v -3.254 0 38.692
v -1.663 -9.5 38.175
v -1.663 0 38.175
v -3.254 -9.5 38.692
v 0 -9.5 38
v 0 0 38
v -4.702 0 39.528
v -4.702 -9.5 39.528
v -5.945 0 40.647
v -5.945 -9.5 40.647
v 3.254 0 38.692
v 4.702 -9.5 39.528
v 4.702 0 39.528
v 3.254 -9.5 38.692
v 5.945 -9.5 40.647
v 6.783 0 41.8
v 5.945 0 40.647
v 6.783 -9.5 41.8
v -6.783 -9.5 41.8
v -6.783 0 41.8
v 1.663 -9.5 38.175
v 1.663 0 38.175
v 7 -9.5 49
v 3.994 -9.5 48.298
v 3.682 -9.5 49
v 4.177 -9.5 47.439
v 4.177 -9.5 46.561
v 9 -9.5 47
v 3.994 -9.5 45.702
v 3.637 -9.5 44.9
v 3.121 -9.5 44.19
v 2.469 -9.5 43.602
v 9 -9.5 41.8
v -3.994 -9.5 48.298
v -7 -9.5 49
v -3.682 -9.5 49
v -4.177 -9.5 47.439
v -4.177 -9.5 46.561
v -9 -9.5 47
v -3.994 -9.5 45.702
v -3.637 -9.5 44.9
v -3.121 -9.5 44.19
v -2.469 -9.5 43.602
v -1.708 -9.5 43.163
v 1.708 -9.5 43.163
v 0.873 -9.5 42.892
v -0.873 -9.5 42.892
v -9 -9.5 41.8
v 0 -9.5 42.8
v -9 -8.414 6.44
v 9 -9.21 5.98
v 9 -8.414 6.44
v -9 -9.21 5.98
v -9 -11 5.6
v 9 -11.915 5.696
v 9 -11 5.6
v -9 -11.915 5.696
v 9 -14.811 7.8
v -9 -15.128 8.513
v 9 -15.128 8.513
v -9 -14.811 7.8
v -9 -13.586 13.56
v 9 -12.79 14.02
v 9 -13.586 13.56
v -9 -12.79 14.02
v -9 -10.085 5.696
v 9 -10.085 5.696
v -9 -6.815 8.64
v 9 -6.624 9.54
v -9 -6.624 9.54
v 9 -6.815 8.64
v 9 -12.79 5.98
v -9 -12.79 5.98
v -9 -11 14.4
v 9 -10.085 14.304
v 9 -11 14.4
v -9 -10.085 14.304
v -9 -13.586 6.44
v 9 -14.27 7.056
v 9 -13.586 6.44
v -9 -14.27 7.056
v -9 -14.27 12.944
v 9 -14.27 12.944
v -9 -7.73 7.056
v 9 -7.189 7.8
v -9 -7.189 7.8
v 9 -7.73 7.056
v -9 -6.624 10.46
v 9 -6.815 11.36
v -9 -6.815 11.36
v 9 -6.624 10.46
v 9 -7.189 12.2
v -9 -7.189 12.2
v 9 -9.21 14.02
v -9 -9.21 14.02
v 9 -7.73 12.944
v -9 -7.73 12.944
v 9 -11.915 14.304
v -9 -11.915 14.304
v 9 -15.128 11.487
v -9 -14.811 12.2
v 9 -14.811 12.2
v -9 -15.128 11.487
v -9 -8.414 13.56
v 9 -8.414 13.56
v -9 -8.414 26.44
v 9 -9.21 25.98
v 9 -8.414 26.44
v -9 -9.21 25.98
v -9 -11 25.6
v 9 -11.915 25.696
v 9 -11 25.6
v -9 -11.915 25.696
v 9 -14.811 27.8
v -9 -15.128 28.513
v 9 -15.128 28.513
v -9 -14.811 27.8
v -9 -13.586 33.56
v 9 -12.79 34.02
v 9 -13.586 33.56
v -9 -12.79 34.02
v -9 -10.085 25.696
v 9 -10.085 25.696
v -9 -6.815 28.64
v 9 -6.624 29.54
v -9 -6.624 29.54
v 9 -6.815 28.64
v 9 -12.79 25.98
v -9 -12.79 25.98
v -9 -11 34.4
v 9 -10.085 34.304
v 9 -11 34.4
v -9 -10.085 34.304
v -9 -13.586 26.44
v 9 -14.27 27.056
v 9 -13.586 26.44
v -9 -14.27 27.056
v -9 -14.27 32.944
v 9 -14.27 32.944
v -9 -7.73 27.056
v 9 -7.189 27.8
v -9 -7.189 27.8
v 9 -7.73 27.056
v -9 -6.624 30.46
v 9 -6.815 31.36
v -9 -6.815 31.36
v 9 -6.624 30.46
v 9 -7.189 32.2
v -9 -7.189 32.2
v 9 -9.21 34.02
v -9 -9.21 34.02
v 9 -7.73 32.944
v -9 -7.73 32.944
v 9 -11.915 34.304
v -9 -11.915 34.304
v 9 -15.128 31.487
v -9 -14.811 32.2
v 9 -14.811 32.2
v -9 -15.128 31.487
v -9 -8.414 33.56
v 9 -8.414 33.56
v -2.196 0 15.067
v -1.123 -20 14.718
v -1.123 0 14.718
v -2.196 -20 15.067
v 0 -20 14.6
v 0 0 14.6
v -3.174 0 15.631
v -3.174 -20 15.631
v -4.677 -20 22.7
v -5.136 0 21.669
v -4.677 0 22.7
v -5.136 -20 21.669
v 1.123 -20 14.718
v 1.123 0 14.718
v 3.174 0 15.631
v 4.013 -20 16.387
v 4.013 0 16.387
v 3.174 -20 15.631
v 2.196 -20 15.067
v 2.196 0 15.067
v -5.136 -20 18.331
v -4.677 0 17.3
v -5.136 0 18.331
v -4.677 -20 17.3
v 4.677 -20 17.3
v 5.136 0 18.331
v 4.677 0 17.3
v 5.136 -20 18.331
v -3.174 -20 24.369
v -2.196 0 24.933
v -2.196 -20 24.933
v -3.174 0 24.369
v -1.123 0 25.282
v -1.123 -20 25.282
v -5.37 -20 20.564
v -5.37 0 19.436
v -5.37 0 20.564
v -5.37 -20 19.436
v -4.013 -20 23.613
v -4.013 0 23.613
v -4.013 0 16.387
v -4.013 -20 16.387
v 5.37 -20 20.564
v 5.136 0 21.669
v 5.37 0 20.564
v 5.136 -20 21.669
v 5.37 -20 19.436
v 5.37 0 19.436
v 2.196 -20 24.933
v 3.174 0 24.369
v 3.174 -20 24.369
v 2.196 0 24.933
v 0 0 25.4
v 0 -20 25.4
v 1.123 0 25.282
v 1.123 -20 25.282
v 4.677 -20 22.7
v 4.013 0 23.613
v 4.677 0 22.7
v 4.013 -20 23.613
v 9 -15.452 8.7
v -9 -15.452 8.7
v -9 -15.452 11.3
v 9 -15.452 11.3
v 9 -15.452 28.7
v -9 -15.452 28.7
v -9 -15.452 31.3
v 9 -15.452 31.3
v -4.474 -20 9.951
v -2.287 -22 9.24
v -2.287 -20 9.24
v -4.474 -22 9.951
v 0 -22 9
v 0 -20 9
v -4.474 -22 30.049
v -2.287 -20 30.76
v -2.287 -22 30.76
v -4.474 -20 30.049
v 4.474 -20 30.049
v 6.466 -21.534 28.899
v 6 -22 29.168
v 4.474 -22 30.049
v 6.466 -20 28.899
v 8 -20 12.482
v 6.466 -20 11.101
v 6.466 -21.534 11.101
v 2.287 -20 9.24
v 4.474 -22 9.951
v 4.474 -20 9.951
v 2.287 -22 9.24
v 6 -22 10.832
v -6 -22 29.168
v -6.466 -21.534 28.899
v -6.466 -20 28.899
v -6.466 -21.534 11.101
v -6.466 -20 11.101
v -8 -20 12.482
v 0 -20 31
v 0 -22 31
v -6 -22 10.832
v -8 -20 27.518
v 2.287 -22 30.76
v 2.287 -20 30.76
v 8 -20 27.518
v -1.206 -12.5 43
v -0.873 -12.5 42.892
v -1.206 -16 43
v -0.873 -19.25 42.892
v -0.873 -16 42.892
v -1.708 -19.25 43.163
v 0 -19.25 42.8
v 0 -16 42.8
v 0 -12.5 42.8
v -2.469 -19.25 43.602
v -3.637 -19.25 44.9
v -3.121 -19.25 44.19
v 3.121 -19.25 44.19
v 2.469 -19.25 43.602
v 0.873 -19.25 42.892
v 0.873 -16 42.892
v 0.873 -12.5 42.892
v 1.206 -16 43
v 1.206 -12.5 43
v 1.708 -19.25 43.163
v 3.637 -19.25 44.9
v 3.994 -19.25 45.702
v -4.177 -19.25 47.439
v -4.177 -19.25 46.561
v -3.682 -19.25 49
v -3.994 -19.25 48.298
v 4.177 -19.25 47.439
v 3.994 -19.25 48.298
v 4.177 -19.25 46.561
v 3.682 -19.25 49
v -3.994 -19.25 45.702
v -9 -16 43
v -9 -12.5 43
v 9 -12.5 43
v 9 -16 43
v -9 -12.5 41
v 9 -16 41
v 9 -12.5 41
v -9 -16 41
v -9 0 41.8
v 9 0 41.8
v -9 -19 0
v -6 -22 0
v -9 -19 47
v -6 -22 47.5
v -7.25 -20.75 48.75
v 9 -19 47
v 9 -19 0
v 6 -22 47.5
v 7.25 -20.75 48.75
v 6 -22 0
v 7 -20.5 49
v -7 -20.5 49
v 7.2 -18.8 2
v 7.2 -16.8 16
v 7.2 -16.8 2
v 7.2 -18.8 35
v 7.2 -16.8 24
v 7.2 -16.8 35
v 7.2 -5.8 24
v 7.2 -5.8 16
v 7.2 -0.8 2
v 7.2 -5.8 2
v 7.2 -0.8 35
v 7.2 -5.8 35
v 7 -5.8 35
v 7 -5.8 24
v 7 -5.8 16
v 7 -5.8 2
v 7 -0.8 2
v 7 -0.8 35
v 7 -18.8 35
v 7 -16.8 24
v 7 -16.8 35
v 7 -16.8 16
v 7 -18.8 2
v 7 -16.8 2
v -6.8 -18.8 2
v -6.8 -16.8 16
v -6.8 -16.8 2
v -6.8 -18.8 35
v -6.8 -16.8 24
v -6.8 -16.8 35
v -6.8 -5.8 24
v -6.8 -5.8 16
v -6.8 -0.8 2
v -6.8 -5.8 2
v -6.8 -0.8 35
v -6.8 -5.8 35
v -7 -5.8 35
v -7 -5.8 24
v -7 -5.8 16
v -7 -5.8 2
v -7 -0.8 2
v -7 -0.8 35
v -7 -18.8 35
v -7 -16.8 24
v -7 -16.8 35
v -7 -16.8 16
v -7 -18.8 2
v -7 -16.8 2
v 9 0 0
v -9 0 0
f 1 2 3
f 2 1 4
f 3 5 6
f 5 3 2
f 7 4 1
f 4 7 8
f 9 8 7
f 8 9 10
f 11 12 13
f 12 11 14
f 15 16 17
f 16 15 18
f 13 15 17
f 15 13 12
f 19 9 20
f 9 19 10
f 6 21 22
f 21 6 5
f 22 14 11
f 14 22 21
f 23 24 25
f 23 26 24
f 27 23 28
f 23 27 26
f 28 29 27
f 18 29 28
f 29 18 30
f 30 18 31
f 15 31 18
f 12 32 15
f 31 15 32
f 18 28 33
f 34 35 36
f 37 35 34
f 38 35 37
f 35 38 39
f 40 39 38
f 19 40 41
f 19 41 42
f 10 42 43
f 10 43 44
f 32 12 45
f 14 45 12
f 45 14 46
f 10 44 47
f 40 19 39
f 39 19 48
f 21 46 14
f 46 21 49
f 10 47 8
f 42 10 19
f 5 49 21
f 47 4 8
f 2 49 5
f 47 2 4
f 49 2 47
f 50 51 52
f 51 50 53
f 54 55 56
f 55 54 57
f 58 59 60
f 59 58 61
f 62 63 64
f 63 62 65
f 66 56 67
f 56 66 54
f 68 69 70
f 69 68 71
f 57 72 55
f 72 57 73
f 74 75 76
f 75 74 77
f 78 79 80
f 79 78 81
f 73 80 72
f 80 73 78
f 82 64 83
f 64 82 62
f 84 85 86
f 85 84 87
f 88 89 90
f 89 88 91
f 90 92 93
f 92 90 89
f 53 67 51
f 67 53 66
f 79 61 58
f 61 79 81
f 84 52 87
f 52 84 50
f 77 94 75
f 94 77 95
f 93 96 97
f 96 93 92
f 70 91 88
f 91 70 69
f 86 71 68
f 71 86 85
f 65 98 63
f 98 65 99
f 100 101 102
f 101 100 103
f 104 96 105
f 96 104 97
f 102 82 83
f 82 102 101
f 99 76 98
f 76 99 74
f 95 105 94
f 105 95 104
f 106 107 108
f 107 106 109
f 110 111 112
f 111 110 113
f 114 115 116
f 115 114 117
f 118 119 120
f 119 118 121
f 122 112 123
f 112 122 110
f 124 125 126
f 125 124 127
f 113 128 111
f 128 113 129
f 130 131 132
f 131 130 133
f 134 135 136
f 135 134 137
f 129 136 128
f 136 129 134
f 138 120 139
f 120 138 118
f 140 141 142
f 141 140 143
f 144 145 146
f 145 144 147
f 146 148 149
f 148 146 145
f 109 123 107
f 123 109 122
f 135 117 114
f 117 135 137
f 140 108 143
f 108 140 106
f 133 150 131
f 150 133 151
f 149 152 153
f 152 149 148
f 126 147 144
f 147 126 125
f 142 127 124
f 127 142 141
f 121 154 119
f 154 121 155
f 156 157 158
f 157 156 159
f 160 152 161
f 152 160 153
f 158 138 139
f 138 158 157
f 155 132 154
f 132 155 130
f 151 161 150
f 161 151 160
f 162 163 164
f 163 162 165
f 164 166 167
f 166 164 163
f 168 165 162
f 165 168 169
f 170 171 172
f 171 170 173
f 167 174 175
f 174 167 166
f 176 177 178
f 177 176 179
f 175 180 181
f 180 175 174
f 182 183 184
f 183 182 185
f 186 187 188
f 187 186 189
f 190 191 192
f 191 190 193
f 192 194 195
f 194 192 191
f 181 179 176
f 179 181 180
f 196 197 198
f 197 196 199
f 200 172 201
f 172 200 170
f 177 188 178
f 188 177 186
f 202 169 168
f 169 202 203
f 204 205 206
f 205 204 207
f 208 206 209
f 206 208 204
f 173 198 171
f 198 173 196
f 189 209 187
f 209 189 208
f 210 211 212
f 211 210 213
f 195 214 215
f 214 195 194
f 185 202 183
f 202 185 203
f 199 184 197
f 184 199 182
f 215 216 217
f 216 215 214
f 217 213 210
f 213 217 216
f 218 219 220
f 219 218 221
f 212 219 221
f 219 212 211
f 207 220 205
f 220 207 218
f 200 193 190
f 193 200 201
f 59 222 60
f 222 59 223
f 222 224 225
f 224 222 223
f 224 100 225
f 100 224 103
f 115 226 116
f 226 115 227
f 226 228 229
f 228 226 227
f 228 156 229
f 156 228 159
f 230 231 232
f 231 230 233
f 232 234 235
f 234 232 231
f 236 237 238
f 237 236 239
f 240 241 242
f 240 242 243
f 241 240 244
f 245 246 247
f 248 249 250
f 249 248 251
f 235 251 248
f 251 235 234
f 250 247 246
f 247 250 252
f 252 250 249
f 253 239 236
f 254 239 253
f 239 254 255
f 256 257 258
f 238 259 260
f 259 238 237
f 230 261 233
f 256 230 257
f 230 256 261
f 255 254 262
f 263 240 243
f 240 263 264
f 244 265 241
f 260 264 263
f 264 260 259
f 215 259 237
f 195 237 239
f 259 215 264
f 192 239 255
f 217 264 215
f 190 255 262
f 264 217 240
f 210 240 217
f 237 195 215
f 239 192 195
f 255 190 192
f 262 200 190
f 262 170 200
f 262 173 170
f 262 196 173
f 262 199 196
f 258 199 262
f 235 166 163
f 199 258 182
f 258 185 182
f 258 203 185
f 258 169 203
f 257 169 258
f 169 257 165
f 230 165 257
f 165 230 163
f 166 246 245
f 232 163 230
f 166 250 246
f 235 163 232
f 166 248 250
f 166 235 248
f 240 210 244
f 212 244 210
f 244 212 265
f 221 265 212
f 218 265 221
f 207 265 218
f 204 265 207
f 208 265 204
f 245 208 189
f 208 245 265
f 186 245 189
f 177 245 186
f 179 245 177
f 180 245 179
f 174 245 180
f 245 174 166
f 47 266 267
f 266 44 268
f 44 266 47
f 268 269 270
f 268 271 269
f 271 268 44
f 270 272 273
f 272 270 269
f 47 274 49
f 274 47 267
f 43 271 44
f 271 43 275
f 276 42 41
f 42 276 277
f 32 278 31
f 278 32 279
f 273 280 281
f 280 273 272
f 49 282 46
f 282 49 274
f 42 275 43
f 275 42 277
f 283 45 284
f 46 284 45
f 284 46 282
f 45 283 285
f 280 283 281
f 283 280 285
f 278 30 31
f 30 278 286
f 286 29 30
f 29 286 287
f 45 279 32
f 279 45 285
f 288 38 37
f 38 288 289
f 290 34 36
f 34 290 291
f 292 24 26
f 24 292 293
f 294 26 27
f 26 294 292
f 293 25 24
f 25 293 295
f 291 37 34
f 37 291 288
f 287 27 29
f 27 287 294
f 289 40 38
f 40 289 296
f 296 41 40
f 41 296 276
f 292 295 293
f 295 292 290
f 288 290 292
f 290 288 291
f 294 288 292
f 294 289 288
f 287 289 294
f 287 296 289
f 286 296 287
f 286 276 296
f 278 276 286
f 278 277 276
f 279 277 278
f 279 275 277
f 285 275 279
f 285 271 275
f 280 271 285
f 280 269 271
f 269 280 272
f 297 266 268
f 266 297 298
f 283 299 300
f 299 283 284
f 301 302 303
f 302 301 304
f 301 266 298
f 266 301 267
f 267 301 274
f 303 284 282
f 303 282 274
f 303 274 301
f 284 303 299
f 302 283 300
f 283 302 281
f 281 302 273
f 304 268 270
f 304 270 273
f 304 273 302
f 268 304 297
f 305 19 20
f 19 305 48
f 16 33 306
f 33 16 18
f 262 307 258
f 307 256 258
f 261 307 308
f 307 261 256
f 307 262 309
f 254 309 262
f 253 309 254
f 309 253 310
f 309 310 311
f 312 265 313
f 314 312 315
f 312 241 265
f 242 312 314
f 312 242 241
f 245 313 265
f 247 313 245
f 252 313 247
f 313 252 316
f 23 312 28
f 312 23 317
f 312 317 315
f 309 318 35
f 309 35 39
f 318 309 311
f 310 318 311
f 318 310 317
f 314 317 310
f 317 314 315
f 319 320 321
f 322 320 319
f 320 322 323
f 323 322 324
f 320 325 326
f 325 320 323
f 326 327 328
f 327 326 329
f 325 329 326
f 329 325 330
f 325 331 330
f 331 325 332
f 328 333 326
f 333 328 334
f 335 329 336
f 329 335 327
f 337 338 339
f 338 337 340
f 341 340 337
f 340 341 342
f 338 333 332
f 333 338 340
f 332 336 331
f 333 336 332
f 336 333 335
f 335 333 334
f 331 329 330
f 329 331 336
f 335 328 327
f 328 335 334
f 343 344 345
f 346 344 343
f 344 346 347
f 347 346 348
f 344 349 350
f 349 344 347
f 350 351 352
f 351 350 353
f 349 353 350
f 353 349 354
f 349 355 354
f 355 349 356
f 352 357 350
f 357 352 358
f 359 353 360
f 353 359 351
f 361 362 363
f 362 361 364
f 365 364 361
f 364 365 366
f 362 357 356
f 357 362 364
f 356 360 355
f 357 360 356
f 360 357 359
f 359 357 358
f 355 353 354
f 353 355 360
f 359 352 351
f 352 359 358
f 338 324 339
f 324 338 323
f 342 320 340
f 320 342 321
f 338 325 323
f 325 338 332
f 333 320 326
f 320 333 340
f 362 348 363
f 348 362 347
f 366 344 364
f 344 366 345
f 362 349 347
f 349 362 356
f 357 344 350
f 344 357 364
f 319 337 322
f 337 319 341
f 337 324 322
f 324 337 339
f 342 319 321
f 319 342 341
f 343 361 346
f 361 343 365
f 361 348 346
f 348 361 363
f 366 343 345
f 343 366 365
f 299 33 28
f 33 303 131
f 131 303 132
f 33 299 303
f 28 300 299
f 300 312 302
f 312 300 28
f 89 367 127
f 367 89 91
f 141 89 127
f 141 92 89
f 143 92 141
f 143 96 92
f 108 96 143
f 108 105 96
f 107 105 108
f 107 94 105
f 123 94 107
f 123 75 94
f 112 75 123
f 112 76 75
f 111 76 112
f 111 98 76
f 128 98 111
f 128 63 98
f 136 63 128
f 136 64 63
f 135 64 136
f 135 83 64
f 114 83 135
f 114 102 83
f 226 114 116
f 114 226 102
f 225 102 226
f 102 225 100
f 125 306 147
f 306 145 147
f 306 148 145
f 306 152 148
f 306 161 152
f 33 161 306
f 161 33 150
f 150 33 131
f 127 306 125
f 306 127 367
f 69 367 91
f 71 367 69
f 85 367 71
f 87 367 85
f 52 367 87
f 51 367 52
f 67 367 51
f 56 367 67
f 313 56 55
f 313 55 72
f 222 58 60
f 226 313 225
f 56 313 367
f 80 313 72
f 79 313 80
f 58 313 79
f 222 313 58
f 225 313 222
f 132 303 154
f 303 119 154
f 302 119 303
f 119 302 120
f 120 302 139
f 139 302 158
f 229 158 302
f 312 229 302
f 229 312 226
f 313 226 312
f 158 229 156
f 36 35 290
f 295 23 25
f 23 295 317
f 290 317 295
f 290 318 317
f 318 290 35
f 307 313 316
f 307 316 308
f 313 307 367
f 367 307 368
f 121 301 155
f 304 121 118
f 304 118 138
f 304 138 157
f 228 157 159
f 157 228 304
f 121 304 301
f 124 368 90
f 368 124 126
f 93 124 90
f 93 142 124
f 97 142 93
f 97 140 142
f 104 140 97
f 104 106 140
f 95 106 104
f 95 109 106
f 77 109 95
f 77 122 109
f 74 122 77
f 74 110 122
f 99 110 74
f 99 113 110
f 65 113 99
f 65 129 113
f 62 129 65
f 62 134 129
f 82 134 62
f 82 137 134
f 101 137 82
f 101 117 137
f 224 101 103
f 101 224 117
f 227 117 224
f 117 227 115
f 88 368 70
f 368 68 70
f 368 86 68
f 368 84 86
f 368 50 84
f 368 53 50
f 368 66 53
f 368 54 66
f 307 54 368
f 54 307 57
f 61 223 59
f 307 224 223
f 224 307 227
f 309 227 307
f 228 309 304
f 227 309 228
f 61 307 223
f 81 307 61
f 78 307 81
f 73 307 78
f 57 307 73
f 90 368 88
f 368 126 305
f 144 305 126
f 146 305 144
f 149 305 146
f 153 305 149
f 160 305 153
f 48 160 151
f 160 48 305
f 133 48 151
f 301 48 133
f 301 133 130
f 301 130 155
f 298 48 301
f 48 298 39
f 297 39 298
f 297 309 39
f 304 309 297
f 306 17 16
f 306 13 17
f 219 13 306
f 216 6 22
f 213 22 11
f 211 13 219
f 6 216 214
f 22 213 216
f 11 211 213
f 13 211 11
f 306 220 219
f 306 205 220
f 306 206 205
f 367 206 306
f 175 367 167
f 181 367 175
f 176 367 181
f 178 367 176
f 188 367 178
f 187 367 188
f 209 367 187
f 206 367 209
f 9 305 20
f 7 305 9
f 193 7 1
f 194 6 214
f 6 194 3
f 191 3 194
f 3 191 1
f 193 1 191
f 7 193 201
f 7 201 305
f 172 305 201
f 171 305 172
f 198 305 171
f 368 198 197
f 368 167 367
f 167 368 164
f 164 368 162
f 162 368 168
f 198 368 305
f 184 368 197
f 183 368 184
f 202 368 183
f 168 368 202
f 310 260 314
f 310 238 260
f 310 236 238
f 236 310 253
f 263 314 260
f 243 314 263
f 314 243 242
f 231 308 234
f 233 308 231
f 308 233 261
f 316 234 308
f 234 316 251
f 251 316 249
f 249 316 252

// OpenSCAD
// PRUSA iteration3
// Y frame corners
// GNU GPL v3
// Josef Průša <iam@josefprusa.cz> and contributors
// http://www.reprap.org/wiki/Prusa_Mendel
// http://prusamendel.org


module corner_base(){	
 translate([-9,-11,0])cube([18,22,49]);
 
}

module corner_holes(){
 translate([-11,-11,0]){
  // Bottom hole
  translate([0,11,10]) rotate([0,90,0]) translate([0,0,-5]) cylinder(h = 270, r=4.4, $fn=30);
  // Top hole
  translate([0,11,30]) rotate([0,90,0]) translate([0,0,-5]) cylinder(h = 270, r=4.4, $fn=30);
  // Middle hole
  translate([11,0,20]) rotate([0,0,90]) rotate([0,90,0]) translate([0,0,-5]) cylinder(h = 270, r=5.4, $fn=30);
  // NV: keep these 2 lines
  // Bottom hole bridge
  translate([0,8.8,10]) rotate([0,90,0]) translate([0,0,-5]) cylinder(h = 270, r=2.6, $fn=6);
  // Top hole bridge
  translate([0,8.8,30]) rotate([0,90,0]) translate([0,0,-5]) cylinder(h = 270, r=2.6, $fn=6);

  // Washer hole
  translate([11,-3,20]) rotate([0,0,90]) rotate([0,90,0]) translate([0,0,-5]) cylinder(h = 10, r=11, $fn=30);

  // Top smooth rod insert
  // Smooth rod place
  // NV: keep this for more clearance
  translate([11,2.75,47]) rotate([0,90,90]) cylinder(h = 10, r=4.2, $fn=30); 
  // Ziptie
  translate([-5,6,41])  cube([30,3.5,2]);
  
  // LM8UU keepout
  difference(){
    translate([11,12.5,46]) rotate([0,90,90]) cylinder(h = 270, r=8, $fn=30);
    translate([21,12.5,62]) rotate([0,90,90]) cube([20,20,30]);
  } 
// NV: removed useless tab
  translate([21,12.5,57]) rotate([0,90,90]) cube([15.2,20,20]);
 
 }
 
}

module corner_fancy(){
 // Side corner cutouts
  translate([-8,-9,0]) rotate([0,0,-45-180]) translate([-15,0,-1]) cube([30,30,51]);
  translate([8,-9,0]) rotate([0,0,45-180]) translate([-15,0,-1]) cube([30,30,51]);
 // Top corner cutouts
    translate([7,0,49]) rotate([0,45,0]) translate([-15,-15,0]) cube([30,30,30]);
    translate([-7,0,49]) rotate([0,-45,0]) translate([-15,-15,0]) cube([30,30,30]);
    rotate([0,0,90]){
    translate([-9.5,0,49]) rotate([0,-45,0]) translate([-15,-15,0]) cube([30,30,30]);
    }
}

// NV: keep this doesnt impact anything
module selective_infill(){
    
    translate([7,2,0.8])cube([0.2,33,5]); 
    translate([-7,2,0.8])cube([0.2,33,5]);
    
    translate([ 7,16,5.8])cube([0.2,8,11]);
    translate([-7,16,5.8])cube([0.2,8,11]);
    
    translate([7,2,16.8])cube([0.2,33,2]); 
    translate([-7,2,16.8])cube([0.2,33,2]);
}
    
    
// Final part
module corner(){
 // Rotate the part for better printing
    translate([0,0,11]) rotate([-90,0,0]) 
    {
    difference(){
        corner_base();
        corner_holes();
        corner_fancy();
        translate([0,11,0]) rotate([90,0,0])selective_infill();
        
    }
    }

}

rotate([90,0,0]) corner();
